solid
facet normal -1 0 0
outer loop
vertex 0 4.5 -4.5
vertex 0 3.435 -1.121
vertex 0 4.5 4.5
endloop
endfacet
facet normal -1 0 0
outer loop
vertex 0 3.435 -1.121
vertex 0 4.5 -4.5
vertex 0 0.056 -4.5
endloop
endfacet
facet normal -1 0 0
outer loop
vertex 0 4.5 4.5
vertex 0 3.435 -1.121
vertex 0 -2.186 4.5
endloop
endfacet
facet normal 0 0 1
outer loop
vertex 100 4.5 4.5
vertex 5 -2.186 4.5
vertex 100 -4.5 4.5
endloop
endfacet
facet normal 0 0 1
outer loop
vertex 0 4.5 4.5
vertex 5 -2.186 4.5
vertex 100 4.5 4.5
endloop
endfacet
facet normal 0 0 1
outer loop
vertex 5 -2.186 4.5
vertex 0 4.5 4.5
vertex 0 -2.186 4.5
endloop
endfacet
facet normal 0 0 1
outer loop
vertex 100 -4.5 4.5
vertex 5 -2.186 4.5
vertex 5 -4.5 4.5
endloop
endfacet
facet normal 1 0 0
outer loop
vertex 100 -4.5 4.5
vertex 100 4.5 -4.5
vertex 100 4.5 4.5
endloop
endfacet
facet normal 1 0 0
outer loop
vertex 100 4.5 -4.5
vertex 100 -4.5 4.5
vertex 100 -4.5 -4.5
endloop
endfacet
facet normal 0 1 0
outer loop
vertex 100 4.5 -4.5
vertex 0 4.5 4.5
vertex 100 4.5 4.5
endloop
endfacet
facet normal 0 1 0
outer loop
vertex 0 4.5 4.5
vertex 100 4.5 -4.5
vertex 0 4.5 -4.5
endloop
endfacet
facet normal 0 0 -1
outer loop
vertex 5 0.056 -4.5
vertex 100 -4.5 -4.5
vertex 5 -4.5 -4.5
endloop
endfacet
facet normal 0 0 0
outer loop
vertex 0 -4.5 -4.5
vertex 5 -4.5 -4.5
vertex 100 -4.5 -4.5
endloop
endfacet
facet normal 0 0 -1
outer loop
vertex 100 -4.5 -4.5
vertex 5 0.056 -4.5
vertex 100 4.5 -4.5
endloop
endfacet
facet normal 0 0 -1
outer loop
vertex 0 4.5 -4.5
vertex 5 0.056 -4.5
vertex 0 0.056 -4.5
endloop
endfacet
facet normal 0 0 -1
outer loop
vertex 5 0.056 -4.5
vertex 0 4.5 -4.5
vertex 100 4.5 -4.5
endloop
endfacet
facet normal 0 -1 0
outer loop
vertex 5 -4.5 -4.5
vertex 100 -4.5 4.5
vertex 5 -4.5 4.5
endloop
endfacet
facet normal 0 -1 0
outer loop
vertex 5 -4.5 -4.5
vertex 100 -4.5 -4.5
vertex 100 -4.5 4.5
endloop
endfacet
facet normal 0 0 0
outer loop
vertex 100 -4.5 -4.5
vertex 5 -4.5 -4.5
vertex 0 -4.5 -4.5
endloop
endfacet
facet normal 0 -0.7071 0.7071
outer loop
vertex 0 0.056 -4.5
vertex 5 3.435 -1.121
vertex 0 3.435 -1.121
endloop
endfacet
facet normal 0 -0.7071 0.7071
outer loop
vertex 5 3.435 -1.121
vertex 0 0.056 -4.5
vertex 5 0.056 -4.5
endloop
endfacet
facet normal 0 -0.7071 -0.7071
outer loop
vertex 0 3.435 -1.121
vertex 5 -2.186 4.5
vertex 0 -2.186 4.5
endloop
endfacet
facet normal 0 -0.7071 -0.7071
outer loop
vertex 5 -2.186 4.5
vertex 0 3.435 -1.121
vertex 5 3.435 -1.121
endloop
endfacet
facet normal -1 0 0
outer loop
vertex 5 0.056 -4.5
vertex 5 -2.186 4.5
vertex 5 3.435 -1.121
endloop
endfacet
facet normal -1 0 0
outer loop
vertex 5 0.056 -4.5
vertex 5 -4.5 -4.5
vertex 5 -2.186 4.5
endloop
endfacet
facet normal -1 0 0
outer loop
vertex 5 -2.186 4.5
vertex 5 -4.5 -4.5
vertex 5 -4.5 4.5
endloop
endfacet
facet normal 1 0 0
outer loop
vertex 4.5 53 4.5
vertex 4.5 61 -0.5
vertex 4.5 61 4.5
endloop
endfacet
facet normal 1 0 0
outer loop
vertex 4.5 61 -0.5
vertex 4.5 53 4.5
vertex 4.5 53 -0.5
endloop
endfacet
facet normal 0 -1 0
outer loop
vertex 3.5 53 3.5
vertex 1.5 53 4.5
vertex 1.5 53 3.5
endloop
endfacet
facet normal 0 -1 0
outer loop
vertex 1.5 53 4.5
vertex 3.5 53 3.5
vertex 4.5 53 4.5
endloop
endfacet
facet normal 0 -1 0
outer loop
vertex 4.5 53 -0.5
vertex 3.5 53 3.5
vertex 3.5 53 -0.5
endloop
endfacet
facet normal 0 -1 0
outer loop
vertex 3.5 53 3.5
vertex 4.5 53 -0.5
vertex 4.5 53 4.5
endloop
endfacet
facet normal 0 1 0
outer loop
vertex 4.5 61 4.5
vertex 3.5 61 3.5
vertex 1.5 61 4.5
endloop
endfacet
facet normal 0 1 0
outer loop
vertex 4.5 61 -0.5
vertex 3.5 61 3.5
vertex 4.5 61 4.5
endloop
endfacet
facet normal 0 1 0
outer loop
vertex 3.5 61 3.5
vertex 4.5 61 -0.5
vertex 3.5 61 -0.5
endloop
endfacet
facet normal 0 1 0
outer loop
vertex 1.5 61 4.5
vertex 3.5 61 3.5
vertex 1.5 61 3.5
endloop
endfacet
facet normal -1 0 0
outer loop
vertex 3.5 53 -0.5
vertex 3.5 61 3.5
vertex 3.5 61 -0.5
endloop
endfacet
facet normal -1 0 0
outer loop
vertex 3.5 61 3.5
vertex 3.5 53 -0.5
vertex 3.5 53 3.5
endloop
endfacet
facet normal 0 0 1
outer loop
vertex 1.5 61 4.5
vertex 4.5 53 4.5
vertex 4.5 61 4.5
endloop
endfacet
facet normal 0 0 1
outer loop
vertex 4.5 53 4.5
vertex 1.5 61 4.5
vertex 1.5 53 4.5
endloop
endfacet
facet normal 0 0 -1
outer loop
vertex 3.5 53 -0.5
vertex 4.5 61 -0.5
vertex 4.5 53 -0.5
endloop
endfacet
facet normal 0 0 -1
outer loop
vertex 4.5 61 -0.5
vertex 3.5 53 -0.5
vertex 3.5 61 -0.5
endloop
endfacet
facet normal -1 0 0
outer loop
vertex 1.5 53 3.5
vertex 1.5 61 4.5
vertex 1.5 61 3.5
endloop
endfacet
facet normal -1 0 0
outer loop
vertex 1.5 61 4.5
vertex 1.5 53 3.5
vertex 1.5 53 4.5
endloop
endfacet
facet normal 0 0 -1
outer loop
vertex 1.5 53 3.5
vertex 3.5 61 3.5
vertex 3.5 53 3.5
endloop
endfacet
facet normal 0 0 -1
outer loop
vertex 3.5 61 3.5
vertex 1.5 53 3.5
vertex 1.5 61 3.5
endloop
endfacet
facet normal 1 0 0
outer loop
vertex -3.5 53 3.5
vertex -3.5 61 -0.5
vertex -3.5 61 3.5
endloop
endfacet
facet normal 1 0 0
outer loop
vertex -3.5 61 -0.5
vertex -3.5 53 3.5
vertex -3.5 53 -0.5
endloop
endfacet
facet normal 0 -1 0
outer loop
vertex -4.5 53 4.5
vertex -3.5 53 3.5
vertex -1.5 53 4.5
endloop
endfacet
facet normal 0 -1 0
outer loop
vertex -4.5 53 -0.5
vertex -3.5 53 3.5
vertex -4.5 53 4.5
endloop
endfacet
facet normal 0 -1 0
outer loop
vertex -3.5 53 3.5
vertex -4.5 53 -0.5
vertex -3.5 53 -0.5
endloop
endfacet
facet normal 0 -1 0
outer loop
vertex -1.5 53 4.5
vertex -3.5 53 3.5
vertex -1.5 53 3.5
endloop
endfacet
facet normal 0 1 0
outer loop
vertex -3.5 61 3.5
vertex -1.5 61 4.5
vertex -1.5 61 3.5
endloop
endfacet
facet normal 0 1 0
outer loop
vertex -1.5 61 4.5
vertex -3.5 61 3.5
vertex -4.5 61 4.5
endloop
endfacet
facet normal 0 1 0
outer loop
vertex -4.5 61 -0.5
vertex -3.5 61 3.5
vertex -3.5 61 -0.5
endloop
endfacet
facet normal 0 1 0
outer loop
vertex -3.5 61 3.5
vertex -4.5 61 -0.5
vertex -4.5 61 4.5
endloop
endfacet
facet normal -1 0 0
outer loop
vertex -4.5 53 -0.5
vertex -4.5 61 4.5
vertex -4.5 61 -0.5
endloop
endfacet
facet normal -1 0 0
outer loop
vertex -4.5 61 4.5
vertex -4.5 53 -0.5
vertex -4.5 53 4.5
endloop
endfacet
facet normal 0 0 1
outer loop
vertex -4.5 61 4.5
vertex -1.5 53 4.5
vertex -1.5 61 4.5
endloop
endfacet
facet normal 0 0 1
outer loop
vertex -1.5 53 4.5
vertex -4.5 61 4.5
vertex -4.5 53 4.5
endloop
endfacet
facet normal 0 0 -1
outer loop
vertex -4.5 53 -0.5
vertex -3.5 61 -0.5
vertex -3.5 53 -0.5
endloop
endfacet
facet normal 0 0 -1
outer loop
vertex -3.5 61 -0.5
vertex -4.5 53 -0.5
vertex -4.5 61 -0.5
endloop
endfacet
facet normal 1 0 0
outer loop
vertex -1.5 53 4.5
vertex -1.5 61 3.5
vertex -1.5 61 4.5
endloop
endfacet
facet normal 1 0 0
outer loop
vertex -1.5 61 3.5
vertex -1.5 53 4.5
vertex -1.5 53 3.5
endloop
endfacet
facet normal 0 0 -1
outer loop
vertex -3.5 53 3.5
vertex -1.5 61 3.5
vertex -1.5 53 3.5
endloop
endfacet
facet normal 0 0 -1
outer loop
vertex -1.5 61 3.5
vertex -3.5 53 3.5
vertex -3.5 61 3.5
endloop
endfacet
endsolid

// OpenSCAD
$fn=50;
BOX_W = 38; // Box Width
BOX_L = 86;// Box Length
BOX_H = 1.0; // Box Height
//SCREW_SIZE = .5; // Screw size in mm
CORNER_RADIUS = 1.0; // Radius of corners
WALL = 1.0;// Wall Thickness

KEEL_WIDTH=9.0;
KEEL_HEIGHT=9.0;
KEEL_LENGTH=100;

VENT_OFFSET = 2.5;
VENT_L = 16.5;
VENT_R = -18.5;

        difference() {
            rotate([0,90,0])
            linear_extrude(KEEL_LENGTH) square([KEEL_WIDTH, KEEL_HEIGHT], center=true); 
            
            // front of keel slope
            translate([-5, -5, 93])
            rotate([45, 0, 0])
            #cube([10, 11, 8]);  
            
            // back of keel slope
            translate([-5, -10, 1])
            rotate([-45, 0, 0])
            cube([10, 11, 8]); 
            
            //center cutout - vent
            // y, z, x
            translate([-1.0,-5, 40])
            rotate([0,0,0])
            //y, z, x
            cube([1.5, 12, 25]);
        }
        

        
        // Inverted L-shaped C-clamp
        difference() {
            translate([KEEL_WIDTH/2-3, KEEL_LENGTH-18, -0.5])
            rotate([90, 0, 0])
            union() {
                // Vertical arm of the C-clamp 2
                translate([2.0, 0, 21]) cube([1, 5, 8]);
                // Horizontal arm of the C-clamp
                rotate([90, 0, 0])
                translate([0, 21, -5]) cube([2, 8, 1]);
                  
                // Vertical arm of the C-clamp 1
                translate([-6, 0, 21]) cube([1, 5, 8]);
                // Horizontal arm of the C-clamp
                rotate([90, 0, 0])
                translate([-5.0, 21,-5]) cube([2, 8, 1]);
            }
        }
        
